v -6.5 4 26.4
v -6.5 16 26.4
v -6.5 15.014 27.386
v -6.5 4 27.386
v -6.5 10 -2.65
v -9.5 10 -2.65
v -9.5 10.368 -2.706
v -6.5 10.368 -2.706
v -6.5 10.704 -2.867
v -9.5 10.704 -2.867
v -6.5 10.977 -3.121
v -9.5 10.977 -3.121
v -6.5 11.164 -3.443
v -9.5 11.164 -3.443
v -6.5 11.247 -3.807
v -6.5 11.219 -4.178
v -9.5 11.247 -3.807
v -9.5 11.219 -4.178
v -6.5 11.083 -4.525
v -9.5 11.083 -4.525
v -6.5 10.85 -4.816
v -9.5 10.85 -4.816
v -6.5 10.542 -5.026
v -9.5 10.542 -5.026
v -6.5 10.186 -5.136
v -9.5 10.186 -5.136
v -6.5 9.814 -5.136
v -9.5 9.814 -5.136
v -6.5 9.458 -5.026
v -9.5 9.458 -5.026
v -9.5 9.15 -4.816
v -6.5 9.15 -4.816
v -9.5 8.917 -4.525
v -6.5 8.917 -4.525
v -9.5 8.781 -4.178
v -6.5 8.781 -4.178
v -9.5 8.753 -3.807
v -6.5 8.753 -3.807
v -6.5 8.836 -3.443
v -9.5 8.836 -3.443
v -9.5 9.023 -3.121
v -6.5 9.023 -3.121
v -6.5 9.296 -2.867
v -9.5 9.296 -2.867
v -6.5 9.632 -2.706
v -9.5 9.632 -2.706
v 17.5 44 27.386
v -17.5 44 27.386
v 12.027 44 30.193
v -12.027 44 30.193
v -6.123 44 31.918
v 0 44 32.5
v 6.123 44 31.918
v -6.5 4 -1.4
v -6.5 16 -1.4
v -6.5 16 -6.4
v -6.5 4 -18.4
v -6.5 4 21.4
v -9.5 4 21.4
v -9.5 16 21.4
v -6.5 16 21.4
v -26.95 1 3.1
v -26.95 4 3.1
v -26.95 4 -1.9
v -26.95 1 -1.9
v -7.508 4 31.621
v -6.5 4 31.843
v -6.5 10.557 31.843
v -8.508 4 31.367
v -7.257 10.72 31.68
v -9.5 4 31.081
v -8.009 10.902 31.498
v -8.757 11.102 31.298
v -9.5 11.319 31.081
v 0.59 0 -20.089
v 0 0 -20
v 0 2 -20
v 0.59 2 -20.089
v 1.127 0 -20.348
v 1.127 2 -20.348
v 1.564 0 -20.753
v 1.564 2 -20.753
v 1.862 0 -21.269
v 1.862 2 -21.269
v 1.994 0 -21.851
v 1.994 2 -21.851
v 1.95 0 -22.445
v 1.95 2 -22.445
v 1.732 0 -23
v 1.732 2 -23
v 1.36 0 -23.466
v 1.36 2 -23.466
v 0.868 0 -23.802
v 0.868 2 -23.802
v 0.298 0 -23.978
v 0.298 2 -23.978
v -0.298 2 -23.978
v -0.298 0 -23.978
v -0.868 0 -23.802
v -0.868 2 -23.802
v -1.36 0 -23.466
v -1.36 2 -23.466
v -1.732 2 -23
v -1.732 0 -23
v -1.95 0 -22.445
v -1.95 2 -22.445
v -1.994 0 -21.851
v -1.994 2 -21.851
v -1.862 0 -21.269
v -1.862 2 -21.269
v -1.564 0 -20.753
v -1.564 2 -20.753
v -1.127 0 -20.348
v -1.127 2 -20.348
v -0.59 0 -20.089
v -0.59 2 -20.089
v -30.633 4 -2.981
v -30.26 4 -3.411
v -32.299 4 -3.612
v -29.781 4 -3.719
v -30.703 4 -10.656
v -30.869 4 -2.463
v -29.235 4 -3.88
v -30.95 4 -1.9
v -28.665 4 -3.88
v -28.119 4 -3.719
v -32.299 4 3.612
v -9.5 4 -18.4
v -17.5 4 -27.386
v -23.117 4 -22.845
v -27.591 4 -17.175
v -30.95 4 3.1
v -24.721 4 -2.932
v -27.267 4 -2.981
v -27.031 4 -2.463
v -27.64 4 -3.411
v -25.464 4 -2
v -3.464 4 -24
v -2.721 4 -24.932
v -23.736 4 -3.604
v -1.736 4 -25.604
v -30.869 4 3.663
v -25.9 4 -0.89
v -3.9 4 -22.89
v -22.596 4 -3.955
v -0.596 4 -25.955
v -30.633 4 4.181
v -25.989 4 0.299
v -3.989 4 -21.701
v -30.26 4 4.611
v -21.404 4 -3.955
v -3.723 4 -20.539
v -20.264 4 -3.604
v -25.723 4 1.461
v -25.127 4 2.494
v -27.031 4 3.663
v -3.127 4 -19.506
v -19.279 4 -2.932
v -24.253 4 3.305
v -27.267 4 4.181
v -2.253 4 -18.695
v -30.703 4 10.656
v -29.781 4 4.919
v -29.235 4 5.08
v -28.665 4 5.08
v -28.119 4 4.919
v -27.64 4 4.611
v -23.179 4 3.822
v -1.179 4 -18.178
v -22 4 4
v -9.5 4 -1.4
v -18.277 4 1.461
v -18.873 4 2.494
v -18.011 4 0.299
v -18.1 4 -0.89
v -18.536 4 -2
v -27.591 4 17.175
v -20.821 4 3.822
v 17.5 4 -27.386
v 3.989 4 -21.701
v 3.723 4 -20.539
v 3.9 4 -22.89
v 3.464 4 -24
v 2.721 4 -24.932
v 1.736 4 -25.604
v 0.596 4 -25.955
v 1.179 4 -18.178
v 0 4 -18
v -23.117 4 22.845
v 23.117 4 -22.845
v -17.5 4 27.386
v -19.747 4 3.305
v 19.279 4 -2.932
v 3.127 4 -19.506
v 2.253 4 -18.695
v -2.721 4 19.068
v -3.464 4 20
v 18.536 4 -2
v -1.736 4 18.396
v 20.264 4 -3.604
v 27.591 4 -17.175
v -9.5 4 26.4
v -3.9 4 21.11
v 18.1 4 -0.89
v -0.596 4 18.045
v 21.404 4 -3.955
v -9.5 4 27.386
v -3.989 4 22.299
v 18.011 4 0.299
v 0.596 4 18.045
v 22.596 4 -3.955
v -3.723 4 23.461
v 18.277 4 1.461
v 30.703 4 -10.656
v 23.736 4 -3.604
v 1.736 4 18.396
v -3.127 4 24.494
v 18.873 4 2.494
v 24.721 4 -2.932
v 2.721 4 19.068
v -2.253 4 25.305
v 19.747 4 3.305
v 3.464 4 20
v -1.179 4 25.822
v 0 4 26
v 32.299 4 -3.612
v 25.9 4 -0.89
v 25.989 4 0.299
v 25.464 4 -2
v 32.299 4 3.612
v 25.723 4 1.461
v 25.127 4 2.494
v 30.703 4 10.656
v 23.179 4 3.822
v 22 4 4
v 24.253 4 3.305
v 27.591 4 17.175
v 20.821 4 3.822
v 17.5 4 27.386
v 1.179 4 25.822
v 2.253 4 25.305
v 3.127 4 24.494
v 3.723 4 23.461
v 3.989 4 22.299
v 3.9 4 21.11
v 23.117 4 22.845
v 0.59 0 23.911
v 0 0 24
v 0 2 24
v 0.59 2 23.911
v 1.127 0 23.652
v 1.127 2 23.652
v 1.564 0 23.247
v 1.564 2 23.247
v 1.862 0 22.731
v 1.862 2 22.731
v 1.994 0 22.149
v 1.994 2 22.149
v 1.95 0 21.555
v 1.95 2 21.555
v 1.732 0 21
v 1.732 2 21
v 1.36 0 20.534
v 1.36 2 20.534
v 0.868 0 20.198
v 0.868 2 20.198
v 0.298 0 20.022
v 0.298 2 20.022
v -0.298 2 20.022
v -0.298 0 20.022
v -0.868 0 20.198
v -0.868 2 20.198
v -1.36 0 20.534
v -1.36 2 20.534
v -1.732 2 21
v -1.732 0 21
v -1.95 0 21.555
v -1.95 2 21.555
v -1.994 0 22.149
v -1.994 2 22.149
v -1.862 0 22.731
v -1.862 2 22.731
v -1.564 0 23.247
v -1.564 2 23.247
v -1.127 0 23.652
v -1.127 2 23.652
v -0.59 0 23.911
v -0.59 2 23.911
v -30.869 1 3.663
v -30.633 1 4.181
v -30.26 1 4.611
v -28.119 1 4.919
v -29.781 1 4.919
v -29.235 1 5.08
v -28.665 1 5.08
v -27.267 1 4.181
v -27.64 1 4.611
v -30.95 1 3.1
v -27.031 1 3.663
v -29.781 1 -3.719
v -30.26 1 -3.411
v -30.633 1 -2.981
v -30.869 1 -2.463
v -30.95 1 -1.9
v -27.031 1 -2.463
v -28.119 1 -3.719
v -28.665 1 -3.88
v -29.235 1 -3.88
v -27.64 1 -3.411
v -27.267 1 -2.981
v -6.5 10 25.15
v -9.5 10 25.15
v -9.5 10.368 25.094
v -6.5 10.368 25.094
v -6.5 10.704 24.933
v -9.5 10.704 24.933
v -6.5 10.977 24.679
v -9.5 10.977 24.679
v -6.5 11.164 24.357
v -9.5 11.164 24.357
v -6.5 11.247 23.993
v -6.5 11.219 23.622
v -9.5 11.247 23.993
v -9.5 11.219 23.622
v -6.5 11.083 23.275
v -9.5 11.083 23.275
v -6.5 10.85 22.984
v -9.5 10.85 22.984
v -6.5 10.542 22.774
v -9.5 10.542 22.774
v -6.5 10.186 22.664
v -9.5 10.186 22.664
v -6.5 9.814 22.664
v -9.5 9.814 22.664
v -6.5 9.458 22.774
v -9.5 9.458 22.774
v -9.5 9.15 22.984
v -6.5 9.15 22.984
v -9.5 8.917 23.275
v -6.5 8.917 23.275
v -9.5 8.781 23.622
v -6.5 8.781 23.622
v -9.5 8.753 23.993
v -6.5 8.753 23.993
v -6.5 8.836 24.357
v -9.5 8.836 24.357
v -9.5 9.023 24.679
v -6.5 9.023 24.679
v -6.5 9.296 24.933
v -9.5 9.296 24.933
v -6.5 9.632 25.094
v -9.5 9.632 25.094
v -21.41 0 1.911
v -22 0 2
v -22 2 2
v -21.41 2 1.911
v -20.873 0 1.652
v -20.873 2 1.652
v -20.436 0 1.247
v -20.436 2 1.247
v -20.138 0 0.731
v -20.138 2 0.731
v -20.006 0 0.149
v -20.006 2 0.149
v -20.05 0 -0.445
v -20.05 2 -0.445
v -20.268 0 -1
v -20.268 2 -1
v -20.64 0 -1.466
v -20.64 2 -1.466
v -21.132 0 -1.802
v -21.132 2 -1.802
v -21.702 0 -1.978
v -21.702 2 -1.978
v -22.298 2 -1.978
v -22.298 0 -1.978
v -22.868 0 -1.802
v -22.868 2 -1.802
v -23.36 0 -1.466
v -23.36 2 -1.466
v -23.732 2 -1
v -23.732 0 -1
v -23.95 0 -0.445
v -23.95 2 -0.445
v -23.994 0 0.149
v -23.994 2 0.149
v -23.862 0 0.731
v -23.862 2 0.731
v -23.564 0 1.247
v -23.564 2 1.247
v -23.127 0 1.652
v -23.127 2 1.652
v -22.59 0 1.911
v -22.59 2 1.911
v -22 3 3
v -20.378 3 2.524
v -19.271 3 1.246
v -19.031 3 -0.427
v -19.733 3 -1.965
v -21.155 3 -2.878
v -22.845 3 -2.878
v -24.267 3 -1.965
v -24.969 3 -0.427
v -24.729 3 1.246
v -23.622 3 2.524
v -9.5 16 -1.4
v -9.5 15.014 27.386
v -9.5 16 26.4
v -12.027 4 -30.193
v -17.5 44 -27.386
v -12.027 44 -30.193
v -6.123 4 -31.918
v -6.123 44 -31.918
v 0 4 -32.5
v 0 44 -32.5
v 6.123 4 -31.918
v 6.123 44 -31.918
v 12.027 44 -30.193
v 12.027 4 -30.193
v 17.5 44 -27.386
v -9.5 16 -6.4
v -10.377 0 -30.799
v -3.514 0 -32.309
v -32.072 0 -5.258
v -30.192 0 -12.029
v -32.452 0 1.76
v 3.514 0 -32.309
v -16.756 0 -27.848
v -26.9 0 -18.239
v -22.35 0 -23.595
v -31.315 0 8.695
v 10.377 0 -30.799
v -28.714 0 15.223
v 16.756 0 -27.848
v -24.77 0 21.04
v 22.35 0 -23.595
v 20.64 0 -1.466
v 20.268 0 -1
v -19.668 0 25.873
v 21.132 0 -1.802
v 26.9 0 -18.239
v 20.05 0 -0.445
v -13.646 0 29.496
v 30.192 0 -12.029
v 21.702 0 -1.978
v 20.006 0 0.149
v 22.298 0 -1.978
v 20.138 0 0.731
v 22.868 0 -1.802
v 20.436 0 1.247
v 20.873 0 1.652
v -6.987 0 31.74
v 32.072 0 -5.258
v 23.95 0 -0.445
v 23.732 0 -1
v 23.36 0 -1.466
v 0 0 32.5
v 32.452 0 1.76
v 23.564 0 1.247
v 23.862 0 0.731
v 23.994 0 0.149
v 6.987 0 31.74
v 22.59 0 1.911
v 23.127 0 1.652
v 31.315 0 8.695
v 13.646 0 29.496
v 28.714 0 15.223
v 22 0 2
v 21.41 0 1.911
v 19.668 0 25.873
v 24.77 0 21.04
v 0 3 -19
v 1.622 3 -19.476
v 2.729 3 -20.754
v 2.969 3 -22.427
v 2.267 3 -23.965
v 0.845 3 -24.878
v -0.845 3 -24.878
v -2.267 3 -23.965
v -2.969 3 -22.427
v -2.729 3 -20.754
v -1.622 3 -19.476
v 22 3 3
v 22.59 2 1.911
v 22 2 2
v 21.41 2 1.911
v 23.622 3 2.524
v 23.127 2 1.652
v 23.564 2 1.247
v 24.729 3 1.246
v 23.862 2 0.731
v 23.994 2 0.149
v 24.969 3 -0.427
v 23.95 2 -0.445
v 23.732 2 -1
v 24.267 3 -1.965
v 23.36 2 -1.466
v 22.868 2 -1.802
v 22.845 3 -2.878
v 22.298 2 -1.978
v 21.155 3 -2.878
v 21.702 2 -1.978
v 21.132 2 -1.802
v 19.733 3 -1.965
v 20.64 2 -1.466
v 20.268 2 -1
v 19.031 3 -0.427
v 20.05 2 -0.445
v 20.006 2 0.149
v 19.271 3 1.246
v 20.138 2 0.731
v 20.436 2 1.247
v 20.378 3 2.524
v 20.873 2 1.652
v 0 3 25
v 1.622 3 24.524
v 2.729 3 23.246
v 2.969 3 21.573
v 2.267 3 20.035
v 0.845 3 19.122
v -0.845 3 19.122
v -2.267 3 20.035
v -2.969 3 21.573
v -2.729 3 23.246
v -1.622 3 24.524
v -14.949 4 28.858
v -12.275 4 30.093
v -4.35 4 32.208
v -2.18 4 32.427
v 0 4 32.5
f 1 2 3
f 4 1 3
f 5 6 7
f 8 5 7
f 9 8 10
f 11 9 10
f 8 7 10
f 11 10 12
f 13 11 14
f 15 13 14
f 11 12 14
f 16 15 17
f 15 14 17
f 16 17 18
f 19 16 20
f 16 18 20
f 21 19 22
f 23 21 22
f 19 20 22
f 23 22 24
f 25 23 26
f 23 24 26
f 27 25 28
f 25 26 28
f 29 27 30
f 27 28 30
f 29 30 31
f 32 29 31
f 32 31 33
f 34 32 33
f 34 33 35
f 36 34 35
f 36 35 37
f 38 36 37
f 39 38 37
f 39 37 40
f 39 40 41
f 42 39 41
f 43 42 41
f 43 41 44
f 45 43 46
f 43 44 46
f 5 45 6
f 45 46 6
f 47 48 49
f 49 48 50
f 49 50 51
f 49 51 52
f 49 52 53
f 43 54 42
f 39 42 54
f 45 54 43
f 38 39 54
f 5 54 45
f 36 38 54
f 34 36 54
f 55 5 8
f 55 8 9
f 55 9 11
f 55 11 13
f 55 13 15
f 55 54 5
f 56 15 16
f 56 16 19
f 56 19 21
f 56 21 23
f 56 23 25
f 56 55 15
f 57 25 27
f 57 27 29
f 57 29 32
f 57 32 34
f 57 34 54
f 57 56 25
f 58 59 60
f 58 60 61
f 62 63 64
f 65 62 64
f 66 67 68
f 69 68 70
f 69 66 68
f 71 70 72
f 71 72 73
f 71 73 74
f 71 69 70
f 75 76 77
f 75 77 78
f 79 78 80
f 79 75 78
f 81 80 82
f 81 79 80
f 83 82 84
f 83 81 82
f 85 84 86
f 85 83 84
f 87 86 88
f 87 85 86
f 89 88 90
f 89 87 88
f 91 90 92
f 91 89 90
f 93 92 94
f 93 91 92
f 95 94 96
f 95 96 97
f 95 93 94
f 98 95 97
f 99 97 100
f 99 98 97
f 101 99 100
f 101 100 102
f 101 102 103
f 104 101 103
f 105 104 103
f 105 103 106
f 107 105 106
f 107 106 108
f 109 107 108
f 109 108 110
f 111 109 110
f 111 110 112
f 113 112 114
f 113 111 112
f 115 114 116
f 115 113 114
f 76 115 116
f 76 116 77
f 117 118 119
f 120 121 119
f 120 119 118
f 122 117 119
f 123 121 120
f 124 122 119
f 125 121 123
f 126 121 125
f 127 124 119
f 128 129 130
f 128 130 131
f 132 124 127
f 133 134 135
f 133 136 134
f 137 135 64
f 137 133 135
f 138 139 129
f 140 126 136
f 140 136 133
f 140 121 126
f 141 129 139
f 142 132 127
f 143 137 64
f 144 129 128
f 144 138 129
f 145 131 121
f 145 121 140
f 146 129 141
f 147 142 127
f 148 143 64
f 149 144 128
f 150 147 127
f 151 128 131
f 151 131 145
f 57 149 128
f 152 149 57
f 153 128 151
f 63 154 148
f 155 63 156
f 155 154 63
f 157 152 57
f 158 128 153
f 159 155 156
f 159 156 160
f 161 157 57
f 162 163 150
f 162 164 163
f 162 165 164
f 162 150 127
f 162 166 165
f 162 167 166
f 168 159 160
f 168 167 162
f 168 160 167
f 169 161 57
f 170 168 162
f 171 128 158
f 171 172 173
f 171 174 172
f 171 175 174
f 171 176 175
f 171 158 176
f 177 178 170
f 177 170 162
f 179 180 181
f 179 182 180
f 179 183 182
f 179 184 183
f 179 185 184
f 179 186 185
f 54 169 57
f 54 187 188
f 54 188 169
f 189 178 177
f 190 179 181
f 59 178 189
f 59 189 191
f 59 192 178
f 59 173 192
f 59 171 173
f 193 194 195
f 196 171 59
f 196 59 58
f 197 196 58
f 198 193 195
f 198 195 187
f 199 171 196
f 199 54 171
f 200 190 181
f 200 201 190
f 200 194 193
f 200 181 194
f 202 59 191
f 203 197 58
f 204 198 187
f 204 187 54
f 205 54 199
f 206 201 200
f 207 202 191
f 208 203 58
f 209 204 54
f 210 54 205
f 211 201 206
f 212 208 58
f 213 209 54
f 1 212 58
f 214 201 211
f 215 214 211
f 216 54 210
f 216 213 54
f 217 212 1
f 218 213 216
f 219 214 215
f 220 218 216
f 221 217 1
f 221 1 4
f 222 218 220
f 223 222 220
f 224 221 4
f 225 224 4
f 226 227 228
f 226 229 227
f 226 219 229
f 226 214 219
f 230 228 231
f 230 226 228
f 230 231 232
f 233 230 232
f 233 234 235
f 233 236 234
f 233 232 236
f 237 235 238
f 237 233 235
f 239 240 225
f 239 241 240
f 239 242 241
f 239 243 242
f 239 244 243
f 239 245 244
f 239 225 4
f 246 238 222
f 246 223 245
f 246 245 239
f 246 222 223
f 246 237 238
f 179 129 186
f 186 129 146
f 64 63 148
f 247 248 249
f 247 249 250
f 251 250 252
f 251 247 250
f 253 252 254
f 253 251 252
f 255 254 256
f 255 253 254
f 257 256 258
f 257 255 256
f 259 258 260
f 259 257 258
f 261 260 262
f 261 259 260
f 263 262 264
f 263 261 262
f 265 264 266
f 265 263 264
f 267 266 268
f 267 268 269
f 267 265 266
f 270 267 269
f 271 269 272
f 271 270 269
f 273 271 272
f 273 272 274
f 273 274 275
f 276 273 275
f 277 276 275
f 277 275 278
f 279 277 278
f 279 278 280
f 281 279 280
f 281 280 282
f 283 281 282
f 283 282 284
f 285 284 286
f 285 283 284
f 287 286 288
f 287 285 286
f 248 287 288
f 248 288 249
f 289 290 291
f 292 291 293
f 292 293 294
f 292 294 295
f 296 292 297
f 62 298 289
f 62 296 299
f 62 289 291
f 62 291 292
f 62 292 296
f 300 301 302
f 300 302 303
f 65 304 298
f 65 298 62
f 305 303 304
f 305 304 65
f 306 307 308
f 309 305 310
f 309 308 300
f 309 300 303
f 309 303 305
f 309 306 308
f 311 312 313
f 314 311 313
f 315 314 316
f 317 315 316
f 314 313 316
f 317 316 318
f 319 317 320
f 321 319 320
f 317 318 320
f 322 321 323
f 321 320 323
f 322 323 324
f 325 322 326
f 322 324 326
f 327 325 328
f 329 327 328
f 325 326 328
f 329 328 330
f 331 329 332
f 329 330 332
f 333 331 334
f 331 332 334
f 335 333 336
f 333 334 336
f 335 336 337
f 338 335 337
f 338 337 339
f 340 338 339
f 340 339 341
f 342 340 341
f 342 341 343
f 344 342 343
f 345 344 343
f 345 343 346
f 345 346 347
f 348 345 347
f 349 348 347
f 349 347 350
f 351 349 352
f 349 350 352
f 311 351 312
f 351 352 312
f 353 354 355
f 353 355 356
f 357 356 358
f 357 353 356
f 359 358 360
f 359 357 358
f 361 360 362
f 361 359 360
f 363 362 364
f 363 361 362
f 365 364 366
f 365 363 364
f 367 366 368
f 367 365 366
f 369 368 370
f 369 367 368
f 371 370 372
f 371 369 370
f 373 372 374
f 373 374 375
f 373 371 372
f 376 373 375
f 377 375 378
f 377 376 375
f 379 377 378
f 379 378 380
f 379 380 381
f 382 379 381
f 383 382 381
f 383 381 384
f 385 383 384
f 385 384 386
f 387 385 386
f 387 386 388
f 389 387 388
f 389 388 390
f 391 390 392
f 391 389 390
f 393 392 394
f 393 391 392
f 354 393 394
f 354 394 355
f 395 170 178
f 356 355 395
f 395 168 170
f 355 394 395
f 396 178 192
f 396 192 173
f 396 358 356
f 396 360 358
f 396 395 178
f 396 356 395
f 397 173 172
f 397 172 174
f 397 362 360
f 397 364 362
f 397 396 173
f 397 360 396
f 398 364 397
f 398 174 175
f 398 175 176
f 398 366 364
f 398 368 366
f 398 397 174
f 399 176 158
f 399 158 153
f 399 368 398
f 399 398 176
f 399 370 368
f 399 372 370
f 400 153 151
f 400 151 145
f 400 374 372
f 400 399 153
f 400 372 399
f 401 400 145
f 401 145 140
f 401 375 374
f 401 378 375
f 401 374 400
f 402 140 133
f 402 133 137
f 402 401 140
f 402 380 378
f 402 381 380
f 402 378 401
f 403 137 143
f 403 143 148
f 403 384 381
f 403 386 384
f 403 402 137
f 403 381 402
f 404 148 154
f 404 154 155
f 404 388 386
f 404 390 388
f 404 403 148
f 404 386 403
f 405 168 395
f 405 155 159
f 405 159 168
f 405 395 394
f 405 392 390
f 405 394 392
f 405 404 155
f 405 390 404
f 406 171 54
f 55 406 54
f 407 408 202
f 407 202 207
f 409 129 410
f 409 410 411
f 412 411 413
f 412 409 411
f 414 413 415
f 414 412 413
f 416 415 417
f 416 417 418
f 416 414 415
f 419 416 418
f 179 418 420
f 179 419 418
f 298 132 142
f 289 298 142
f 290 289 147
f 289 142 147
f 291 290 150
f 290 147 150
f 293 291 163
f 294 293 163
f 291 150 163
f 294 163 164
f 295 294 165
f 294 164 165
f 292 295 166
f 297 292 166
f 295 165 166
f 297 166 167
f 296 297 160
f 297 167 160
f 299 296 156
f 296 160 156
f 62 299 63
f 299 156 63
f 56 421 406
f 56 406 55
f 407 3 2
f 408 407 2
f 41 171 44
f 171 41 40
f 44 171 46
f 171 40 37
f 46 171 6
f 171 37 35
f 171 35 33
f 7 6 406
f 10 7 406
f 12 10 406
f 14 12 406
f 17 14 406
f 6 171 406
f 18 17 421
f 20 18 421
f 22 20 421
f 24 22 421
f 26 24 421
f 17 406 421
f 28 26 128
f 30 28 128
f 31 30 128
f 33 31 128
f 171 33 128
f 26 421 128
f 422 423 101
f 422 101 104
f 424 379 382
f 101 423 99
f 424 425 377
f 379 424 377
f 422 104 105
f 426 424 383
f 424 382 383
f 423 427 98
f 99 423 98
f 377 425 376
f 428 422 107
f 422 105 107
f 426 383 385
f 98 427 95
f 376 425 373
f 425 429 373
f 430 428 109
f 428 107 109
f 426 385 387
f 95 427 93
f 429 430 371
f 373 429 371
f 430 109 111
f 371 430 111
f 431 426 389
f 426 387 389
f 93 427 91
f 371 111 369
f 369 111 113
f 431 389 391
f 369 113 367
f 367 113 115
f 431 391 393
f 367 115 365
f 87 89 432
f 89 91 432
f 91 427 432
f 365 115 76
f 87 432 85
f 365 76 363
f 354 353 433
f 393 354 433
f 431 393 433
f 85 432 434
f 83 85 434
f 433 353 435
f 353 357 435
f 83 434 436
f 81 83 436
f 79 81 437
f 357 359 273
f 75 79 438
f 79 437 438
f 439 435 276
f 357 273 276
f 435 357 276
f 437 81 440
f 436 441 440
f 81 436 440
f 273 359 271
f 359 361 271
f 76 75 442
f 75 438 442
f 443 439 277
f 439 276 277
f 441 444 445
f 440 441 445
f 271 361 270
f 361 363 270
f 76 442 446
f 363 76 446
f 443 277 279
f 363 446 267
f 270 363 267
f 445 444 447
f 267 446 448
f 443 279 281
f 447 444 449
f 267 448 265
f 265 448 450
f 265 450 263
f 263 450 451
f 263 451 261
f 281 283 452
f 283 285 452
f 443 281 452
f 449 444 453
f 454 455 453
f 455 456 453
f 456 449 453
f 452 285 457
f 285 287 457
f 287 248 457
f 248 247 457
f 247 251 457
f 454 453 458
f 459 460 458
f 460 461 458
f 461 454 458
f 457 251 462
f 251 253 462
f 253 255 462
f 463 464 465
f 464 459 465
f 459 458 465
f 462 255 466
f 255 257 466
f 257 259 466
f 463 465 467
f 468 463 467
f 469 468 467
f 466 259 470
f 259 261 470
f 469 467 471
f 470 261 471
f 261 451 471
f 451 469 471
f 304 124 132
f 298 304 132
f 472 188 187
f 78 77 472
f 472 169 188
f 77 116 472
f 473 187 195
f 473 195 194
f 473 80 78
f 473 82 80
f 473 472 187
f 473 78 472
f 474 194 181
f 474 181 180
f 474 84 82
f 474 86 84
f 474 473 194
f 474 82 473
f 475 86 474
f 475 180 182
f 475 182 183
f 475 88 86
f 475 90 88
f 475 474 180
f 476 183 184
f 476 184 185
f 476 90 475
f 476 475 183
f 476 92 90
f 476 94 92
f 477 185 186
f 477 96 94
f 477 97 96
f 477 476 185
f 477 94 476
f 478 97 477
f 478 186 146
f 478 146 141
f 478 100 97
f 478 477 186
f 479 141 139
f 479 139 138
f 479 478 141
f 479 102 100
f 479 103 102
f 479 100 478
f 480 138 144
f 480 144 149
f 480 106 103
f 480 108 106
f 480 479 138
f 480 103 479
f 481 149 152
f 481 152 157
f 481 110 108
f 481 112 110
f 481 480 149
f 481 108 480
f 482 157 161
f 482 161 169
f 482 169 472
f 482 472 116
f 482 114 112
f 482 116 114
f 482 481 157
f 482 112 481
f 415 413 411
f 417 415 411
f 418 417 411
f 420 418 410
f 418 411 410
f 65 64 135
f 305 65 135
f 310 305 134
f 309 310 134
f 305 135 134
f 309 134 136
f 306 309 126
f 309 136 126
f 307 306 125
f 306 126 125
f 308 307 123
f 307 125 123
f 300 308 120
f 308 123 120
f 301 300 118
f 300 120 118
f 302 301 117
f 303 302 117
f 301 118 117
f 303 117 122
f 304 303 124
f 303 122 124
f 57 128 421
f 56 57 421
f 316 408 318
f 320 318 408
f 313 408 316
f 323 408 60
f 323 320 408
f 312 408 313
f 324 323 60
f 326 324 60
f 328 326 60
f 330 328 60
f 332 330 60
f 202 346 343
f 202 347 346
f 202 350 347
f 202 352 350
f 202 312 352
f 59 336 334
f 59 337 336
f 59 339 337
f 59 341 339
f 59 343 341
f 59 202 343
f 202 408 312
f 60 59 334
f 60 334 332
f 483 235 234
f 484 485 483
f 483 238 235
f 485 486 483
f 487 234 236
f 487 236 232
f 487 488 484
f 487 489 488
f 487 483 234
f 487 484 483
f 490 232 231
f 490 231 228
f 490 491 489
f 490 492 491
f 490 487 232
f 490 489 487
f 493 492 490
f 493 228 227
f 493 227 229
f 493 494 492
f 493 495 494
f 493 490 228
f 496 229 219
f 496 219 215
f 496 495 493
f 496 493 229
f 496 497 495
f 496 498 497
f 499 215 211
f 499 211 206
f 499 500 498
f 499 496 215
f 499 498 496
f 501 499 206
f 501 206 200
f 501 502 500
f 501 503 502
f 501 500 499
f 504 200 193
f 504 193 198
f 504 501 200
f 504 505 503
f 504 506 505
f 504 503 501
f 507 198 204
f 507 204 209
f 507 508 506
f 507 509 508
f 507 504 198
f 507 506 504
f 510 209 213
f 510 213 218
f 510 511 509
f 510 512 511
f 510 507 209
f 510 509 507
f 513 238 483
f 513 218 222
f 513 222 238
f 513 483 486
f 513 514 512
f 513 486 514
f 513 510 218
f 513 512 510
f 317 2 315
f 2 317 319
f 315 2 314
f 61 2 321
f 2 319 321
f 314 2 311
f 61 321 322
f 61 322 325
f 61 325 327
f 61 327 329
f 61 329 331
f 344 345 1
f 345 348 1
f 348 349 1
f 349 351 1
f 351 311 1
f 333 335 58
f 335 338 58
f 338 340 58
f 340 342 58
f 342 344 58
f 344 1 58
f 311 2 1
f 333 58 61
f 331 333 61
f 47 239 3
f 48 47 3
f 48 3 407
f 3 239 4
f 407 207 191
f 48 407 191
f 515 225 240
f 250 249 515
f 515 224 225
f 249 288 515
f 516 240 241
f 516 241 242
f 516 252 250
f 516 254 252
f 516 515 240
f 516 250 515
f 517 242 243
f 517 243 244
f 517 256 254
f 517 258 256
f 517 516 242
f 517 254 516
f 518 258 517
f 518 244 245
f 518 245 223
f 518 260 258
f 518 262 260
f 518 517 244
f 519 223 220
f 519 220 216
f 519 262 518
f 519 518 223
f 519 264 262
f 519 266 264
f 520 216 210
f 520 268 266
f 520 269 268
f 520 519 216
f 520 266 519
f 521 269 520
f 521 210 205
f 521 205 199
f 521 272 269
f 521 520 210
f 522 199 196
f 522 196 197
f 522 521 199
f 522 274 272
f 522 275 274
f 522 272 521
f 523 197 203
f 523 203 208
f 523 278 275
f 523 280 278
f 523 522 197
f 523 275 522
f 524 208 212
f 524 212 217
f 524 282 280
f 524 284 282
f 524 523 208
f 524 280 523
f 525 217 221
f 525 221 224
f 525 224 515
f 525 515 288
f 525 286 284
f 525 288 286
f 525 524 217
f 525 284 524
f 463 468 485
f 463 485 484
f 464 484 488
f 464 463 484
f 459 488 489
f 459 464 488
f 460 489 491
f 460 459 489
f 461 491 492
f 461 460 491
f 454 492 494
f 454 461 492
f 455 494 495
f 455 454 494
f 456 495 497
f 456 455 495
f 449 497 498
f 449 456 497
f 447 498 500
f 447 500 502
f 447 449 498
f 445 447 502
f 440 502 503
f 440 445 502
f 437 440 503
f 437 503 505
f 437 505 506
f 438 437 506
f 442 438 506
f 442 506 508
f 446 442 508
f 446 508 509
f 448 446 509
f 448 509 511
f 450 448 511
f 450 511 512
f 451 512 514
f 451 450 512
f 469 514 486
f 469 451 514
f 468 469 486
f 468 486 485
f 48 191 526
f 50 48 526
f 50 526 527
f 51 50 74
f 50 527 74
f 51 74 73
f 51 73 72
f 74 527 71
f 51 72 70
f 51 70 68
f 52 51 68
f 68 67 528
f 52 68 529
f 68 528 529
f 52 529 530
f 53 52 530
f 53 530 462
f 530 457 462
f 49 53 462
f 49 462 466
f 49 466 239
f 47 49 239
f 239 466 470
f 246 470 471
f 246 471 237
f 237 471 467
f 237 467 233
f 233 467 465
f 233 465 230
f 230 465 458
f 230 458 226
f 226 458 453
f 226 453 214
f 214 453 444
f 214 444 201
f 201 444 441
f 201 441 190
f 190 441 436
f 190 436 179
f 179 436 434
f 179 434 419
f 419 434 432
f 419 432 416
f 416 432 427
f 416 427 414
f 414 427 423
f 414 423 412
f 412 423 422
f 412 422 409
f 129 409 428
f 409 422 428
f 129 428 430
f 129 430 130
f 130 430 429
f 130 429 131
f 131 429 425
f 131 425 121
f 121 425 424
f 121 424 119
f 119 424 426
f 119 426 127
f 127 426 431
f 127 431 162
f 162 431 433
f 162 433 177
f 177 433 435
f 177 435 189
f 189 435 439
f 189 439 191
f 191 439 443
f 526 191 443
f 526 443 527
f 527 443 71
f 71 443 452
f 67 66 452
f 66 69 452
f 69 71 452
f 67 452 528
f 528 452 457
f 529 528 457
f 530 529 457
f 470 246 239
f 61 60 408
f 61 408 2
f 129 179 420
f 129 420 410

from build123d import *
from build123d.topology import SkipClean

# Parameters (mm, degrees)
SKETCH1_R           = 32.5
SKETCH1_R_2         = 2
BOSS_EXTRUDE1_DEPTH = 4
BOSS_EXTRUDE2_DEPTH = 40
CHAMFER1_SIZE       = 2
SKETCH3_W           = 3
SKETCH3_H           = 5
BOSS_EXTRUDE3_DEPTH = 12
SKETCH4_R           = 1.25
CUT_EXTRUDE1_DEPTH  = 3
CUT_EXTRUDE2_DEPTH  = 3
CHAMFER3_SIZE       = 12


with BuildPart() as part:
    # Sketch1 → Boss-Extrude1 (new body)
    with BuildSketch(Plane(origin=(0, 0, 0), x_dir=(1, 0, 0), z_dir=(0, 1, 0))):
        with Locations(Location((0, 0, 0), (0, 0, 270))):
            Circle(SKETCH1_R)
        with Locations(Location((-22, 0, 0), (0, 0, 270))):
            Circle(SKETCH1_R_2, mode=Mode.SUBTRACT)
        with Locations(Location((0, 22, 0), (0, 0, 270))):
            Circle(SKETCH1_R_2, mode=Mode.SUBTRACT)
        with Locations(Location((22, 0, 0), (0, 0, 270))):
            Circle(SKETCH1_R_2, mode=Mode.SUBTRACT)
        with Locations(Location((0, -22, 0), (0, 0, 270))):
            Circle(SKETCH1_R_2, mode=Mode.SUBTRACT)
    extrude(amount=BOSS_EXTRUDE1_DEPTH)

    # Sketch2 → Boss-Extrude2 (add)
    with SkipClean():  # the faces are left unmerged after this step: merging them gives an invalid solid
        with BuildSketch(Plane(origin=(0, 4, 0), x_dir=(1, 0, 0), z_dir=(0, 1, 0))):
            with BuildLine():
                Line((17.5, 27.386127875), (-17.5, 27.386127875))
                ThreePointArc((-17.5, 27.386127875), (0, 32.5), (17.5, 27.386127875))
            make_face()
            with BuildLine():
                Line((17.5, -27.386127875), (-17.5, -27.386127875))
                ThreePointArc((-17.5, -27.386127875), (0, -32.5), (17.5, -27.386127875))
            make_face()
        extrude(amount=BOSS_EXTRUDE2_DEPTH)

    # Chamfer1
    chamfer1_edges = [part.edges().sort_by_distance(p)[0] for p in [
        (22, 4, -2),
        (0, 4, 20),
        (-22, 4, -2),
        (0, 4, -24),
    ]]
    chamfer(chamfer1_edges, length=CHAMFER1_SIZE)

    # Sketch3 → Boss-Extrude3 (add)
    with SkipClean():  # the faces are left unmerged after this step: merging them gives an invalid solid
        with BuildSketch(Plane(origin=(0, 4, 0), x_dir=(1, 0, 0), z_dir=(0, 1, 0))):
            with Locations((-8, 3.9)):
                Rectangle(SKETCH3_W, SKETCH3_H)
            with Locations((-8, -23.9)):
                Rectangle(SKETCH3_W, SKETCH3_H)
        extrude(amount=BOSS_EXTRUDE3_DEPTH)

    # Sketch4 → Cut-Extrude1 (cut)
    with SkipClean():  # the faces are left unmerged after this step: merging them gives an invalid solid
        with BuildSketch(Plane.ZY.offset(9.5)):
            with Locations((-3.9, 10)):
                Circle(SKETCH4_R)
            with Locations((23.9, 10)):
                Circle(SKETCH4_R)
        extrude(amount=-CUT_EXTRUDE1_DEPTH, mode=Mode.SUBTRACT)

    # Sketch5 → Cut-Extrude2 (cut)
    with SkipClean():  # the faces are left unmerged after this step: merging them gives an invalid solid
        with BuildSketch(Plane(origin=(0, 4, 0), x_dir=(1, 0, 0), z_dir=(0, 1, 0))):
            with BuildLine():
                Line((-30.95, 1.9), (-30.95, -3.1))
                ThreePointArc((-30.95, -3.1), (-28.95, -5.1), (-26.95, -3.1))
                Line((-26.95, -3.1), (-26.95, 1.9))
                ThreePointArc((-26.95, 1.9), (-28.95, 3.9), (-30.95, 1.9))
            make_face()
        extrude(amount=-CUT_EXTRUDE2_DEPTH, mode=Mode.SUBTRACT)

    # Chamfer3
    # the kernel refuses this chamfer: 12 mm, written as the material it adds along each edge
    with BuildSketch(Plane(origin=(-9.5, 4, -6.4), x_dir=(0, -0.02749587661058638, -0.9996219169112968), z_dir=(1, 0, 0))) as chamfer3_piece_1_section:
        Polygon((CHAMFER3_SIZE * 0.999621916911, CHAMFER3_SIZE * 0.0274958766106), (-CHAMFER3_SIZE * 0.0274958766106, CHAMFER3_SIZE * 0.999621916911), (0, 0), align=None)
    chamfer3_piece_1 = extrude(amount=3, mode=Mode.PRIVATE)
    chamfer3_piece_1 = split(chamfer3_piece_1, bisect_by=Plane(origin=(-8, 16, -10.364849852), z_dir=(0, -1, 0)), keep=Keep.TOP, mode=Mode.PRIVATE)
    add(chamfer3_piece_1)
    with BuildSketch(Plane(origin=(-6.5, 4, 26.4), x_dir=(-1.1837901526131805e-15, -0.027495876610586386, 0.9996219169112968), z_dir=(-1, 0, 0))) as chamfer3_piece_2_section:
        Polygon((CHAMFER3_SIZE * 0.999621916911, CHAMFER3_SIZE * 0.0274958766106), (-CHAMFER3_SIZE * 0.0274958766106, CHAMFER3_SIZE * 0.999621916911), (0, 0), align=None)
    chamfer3_piece_2 = extrude(amount=3, mode=Mode.PRIVATE)
    chamfer3_piece_2 = chamfer3_piece_2 & Plane(origin=(0, 8.886128488, 0), x_dir=(0, 0, 1), z_dir=(0, -1, 0)) * Cylinder(32.5, 54, mode=Mode.PRIVATE)
    chamfer3_piece_2 = split(chamfer3_piece_2, bisect_by=Plane(origin=(-7.974151993, 16, 28.556689734), z_dir=(0, -1, 0)), keep=Keep.TOP, mode=Mode.PRIVATE)
    add(chamfer3_piece_2)


solid = part.part
